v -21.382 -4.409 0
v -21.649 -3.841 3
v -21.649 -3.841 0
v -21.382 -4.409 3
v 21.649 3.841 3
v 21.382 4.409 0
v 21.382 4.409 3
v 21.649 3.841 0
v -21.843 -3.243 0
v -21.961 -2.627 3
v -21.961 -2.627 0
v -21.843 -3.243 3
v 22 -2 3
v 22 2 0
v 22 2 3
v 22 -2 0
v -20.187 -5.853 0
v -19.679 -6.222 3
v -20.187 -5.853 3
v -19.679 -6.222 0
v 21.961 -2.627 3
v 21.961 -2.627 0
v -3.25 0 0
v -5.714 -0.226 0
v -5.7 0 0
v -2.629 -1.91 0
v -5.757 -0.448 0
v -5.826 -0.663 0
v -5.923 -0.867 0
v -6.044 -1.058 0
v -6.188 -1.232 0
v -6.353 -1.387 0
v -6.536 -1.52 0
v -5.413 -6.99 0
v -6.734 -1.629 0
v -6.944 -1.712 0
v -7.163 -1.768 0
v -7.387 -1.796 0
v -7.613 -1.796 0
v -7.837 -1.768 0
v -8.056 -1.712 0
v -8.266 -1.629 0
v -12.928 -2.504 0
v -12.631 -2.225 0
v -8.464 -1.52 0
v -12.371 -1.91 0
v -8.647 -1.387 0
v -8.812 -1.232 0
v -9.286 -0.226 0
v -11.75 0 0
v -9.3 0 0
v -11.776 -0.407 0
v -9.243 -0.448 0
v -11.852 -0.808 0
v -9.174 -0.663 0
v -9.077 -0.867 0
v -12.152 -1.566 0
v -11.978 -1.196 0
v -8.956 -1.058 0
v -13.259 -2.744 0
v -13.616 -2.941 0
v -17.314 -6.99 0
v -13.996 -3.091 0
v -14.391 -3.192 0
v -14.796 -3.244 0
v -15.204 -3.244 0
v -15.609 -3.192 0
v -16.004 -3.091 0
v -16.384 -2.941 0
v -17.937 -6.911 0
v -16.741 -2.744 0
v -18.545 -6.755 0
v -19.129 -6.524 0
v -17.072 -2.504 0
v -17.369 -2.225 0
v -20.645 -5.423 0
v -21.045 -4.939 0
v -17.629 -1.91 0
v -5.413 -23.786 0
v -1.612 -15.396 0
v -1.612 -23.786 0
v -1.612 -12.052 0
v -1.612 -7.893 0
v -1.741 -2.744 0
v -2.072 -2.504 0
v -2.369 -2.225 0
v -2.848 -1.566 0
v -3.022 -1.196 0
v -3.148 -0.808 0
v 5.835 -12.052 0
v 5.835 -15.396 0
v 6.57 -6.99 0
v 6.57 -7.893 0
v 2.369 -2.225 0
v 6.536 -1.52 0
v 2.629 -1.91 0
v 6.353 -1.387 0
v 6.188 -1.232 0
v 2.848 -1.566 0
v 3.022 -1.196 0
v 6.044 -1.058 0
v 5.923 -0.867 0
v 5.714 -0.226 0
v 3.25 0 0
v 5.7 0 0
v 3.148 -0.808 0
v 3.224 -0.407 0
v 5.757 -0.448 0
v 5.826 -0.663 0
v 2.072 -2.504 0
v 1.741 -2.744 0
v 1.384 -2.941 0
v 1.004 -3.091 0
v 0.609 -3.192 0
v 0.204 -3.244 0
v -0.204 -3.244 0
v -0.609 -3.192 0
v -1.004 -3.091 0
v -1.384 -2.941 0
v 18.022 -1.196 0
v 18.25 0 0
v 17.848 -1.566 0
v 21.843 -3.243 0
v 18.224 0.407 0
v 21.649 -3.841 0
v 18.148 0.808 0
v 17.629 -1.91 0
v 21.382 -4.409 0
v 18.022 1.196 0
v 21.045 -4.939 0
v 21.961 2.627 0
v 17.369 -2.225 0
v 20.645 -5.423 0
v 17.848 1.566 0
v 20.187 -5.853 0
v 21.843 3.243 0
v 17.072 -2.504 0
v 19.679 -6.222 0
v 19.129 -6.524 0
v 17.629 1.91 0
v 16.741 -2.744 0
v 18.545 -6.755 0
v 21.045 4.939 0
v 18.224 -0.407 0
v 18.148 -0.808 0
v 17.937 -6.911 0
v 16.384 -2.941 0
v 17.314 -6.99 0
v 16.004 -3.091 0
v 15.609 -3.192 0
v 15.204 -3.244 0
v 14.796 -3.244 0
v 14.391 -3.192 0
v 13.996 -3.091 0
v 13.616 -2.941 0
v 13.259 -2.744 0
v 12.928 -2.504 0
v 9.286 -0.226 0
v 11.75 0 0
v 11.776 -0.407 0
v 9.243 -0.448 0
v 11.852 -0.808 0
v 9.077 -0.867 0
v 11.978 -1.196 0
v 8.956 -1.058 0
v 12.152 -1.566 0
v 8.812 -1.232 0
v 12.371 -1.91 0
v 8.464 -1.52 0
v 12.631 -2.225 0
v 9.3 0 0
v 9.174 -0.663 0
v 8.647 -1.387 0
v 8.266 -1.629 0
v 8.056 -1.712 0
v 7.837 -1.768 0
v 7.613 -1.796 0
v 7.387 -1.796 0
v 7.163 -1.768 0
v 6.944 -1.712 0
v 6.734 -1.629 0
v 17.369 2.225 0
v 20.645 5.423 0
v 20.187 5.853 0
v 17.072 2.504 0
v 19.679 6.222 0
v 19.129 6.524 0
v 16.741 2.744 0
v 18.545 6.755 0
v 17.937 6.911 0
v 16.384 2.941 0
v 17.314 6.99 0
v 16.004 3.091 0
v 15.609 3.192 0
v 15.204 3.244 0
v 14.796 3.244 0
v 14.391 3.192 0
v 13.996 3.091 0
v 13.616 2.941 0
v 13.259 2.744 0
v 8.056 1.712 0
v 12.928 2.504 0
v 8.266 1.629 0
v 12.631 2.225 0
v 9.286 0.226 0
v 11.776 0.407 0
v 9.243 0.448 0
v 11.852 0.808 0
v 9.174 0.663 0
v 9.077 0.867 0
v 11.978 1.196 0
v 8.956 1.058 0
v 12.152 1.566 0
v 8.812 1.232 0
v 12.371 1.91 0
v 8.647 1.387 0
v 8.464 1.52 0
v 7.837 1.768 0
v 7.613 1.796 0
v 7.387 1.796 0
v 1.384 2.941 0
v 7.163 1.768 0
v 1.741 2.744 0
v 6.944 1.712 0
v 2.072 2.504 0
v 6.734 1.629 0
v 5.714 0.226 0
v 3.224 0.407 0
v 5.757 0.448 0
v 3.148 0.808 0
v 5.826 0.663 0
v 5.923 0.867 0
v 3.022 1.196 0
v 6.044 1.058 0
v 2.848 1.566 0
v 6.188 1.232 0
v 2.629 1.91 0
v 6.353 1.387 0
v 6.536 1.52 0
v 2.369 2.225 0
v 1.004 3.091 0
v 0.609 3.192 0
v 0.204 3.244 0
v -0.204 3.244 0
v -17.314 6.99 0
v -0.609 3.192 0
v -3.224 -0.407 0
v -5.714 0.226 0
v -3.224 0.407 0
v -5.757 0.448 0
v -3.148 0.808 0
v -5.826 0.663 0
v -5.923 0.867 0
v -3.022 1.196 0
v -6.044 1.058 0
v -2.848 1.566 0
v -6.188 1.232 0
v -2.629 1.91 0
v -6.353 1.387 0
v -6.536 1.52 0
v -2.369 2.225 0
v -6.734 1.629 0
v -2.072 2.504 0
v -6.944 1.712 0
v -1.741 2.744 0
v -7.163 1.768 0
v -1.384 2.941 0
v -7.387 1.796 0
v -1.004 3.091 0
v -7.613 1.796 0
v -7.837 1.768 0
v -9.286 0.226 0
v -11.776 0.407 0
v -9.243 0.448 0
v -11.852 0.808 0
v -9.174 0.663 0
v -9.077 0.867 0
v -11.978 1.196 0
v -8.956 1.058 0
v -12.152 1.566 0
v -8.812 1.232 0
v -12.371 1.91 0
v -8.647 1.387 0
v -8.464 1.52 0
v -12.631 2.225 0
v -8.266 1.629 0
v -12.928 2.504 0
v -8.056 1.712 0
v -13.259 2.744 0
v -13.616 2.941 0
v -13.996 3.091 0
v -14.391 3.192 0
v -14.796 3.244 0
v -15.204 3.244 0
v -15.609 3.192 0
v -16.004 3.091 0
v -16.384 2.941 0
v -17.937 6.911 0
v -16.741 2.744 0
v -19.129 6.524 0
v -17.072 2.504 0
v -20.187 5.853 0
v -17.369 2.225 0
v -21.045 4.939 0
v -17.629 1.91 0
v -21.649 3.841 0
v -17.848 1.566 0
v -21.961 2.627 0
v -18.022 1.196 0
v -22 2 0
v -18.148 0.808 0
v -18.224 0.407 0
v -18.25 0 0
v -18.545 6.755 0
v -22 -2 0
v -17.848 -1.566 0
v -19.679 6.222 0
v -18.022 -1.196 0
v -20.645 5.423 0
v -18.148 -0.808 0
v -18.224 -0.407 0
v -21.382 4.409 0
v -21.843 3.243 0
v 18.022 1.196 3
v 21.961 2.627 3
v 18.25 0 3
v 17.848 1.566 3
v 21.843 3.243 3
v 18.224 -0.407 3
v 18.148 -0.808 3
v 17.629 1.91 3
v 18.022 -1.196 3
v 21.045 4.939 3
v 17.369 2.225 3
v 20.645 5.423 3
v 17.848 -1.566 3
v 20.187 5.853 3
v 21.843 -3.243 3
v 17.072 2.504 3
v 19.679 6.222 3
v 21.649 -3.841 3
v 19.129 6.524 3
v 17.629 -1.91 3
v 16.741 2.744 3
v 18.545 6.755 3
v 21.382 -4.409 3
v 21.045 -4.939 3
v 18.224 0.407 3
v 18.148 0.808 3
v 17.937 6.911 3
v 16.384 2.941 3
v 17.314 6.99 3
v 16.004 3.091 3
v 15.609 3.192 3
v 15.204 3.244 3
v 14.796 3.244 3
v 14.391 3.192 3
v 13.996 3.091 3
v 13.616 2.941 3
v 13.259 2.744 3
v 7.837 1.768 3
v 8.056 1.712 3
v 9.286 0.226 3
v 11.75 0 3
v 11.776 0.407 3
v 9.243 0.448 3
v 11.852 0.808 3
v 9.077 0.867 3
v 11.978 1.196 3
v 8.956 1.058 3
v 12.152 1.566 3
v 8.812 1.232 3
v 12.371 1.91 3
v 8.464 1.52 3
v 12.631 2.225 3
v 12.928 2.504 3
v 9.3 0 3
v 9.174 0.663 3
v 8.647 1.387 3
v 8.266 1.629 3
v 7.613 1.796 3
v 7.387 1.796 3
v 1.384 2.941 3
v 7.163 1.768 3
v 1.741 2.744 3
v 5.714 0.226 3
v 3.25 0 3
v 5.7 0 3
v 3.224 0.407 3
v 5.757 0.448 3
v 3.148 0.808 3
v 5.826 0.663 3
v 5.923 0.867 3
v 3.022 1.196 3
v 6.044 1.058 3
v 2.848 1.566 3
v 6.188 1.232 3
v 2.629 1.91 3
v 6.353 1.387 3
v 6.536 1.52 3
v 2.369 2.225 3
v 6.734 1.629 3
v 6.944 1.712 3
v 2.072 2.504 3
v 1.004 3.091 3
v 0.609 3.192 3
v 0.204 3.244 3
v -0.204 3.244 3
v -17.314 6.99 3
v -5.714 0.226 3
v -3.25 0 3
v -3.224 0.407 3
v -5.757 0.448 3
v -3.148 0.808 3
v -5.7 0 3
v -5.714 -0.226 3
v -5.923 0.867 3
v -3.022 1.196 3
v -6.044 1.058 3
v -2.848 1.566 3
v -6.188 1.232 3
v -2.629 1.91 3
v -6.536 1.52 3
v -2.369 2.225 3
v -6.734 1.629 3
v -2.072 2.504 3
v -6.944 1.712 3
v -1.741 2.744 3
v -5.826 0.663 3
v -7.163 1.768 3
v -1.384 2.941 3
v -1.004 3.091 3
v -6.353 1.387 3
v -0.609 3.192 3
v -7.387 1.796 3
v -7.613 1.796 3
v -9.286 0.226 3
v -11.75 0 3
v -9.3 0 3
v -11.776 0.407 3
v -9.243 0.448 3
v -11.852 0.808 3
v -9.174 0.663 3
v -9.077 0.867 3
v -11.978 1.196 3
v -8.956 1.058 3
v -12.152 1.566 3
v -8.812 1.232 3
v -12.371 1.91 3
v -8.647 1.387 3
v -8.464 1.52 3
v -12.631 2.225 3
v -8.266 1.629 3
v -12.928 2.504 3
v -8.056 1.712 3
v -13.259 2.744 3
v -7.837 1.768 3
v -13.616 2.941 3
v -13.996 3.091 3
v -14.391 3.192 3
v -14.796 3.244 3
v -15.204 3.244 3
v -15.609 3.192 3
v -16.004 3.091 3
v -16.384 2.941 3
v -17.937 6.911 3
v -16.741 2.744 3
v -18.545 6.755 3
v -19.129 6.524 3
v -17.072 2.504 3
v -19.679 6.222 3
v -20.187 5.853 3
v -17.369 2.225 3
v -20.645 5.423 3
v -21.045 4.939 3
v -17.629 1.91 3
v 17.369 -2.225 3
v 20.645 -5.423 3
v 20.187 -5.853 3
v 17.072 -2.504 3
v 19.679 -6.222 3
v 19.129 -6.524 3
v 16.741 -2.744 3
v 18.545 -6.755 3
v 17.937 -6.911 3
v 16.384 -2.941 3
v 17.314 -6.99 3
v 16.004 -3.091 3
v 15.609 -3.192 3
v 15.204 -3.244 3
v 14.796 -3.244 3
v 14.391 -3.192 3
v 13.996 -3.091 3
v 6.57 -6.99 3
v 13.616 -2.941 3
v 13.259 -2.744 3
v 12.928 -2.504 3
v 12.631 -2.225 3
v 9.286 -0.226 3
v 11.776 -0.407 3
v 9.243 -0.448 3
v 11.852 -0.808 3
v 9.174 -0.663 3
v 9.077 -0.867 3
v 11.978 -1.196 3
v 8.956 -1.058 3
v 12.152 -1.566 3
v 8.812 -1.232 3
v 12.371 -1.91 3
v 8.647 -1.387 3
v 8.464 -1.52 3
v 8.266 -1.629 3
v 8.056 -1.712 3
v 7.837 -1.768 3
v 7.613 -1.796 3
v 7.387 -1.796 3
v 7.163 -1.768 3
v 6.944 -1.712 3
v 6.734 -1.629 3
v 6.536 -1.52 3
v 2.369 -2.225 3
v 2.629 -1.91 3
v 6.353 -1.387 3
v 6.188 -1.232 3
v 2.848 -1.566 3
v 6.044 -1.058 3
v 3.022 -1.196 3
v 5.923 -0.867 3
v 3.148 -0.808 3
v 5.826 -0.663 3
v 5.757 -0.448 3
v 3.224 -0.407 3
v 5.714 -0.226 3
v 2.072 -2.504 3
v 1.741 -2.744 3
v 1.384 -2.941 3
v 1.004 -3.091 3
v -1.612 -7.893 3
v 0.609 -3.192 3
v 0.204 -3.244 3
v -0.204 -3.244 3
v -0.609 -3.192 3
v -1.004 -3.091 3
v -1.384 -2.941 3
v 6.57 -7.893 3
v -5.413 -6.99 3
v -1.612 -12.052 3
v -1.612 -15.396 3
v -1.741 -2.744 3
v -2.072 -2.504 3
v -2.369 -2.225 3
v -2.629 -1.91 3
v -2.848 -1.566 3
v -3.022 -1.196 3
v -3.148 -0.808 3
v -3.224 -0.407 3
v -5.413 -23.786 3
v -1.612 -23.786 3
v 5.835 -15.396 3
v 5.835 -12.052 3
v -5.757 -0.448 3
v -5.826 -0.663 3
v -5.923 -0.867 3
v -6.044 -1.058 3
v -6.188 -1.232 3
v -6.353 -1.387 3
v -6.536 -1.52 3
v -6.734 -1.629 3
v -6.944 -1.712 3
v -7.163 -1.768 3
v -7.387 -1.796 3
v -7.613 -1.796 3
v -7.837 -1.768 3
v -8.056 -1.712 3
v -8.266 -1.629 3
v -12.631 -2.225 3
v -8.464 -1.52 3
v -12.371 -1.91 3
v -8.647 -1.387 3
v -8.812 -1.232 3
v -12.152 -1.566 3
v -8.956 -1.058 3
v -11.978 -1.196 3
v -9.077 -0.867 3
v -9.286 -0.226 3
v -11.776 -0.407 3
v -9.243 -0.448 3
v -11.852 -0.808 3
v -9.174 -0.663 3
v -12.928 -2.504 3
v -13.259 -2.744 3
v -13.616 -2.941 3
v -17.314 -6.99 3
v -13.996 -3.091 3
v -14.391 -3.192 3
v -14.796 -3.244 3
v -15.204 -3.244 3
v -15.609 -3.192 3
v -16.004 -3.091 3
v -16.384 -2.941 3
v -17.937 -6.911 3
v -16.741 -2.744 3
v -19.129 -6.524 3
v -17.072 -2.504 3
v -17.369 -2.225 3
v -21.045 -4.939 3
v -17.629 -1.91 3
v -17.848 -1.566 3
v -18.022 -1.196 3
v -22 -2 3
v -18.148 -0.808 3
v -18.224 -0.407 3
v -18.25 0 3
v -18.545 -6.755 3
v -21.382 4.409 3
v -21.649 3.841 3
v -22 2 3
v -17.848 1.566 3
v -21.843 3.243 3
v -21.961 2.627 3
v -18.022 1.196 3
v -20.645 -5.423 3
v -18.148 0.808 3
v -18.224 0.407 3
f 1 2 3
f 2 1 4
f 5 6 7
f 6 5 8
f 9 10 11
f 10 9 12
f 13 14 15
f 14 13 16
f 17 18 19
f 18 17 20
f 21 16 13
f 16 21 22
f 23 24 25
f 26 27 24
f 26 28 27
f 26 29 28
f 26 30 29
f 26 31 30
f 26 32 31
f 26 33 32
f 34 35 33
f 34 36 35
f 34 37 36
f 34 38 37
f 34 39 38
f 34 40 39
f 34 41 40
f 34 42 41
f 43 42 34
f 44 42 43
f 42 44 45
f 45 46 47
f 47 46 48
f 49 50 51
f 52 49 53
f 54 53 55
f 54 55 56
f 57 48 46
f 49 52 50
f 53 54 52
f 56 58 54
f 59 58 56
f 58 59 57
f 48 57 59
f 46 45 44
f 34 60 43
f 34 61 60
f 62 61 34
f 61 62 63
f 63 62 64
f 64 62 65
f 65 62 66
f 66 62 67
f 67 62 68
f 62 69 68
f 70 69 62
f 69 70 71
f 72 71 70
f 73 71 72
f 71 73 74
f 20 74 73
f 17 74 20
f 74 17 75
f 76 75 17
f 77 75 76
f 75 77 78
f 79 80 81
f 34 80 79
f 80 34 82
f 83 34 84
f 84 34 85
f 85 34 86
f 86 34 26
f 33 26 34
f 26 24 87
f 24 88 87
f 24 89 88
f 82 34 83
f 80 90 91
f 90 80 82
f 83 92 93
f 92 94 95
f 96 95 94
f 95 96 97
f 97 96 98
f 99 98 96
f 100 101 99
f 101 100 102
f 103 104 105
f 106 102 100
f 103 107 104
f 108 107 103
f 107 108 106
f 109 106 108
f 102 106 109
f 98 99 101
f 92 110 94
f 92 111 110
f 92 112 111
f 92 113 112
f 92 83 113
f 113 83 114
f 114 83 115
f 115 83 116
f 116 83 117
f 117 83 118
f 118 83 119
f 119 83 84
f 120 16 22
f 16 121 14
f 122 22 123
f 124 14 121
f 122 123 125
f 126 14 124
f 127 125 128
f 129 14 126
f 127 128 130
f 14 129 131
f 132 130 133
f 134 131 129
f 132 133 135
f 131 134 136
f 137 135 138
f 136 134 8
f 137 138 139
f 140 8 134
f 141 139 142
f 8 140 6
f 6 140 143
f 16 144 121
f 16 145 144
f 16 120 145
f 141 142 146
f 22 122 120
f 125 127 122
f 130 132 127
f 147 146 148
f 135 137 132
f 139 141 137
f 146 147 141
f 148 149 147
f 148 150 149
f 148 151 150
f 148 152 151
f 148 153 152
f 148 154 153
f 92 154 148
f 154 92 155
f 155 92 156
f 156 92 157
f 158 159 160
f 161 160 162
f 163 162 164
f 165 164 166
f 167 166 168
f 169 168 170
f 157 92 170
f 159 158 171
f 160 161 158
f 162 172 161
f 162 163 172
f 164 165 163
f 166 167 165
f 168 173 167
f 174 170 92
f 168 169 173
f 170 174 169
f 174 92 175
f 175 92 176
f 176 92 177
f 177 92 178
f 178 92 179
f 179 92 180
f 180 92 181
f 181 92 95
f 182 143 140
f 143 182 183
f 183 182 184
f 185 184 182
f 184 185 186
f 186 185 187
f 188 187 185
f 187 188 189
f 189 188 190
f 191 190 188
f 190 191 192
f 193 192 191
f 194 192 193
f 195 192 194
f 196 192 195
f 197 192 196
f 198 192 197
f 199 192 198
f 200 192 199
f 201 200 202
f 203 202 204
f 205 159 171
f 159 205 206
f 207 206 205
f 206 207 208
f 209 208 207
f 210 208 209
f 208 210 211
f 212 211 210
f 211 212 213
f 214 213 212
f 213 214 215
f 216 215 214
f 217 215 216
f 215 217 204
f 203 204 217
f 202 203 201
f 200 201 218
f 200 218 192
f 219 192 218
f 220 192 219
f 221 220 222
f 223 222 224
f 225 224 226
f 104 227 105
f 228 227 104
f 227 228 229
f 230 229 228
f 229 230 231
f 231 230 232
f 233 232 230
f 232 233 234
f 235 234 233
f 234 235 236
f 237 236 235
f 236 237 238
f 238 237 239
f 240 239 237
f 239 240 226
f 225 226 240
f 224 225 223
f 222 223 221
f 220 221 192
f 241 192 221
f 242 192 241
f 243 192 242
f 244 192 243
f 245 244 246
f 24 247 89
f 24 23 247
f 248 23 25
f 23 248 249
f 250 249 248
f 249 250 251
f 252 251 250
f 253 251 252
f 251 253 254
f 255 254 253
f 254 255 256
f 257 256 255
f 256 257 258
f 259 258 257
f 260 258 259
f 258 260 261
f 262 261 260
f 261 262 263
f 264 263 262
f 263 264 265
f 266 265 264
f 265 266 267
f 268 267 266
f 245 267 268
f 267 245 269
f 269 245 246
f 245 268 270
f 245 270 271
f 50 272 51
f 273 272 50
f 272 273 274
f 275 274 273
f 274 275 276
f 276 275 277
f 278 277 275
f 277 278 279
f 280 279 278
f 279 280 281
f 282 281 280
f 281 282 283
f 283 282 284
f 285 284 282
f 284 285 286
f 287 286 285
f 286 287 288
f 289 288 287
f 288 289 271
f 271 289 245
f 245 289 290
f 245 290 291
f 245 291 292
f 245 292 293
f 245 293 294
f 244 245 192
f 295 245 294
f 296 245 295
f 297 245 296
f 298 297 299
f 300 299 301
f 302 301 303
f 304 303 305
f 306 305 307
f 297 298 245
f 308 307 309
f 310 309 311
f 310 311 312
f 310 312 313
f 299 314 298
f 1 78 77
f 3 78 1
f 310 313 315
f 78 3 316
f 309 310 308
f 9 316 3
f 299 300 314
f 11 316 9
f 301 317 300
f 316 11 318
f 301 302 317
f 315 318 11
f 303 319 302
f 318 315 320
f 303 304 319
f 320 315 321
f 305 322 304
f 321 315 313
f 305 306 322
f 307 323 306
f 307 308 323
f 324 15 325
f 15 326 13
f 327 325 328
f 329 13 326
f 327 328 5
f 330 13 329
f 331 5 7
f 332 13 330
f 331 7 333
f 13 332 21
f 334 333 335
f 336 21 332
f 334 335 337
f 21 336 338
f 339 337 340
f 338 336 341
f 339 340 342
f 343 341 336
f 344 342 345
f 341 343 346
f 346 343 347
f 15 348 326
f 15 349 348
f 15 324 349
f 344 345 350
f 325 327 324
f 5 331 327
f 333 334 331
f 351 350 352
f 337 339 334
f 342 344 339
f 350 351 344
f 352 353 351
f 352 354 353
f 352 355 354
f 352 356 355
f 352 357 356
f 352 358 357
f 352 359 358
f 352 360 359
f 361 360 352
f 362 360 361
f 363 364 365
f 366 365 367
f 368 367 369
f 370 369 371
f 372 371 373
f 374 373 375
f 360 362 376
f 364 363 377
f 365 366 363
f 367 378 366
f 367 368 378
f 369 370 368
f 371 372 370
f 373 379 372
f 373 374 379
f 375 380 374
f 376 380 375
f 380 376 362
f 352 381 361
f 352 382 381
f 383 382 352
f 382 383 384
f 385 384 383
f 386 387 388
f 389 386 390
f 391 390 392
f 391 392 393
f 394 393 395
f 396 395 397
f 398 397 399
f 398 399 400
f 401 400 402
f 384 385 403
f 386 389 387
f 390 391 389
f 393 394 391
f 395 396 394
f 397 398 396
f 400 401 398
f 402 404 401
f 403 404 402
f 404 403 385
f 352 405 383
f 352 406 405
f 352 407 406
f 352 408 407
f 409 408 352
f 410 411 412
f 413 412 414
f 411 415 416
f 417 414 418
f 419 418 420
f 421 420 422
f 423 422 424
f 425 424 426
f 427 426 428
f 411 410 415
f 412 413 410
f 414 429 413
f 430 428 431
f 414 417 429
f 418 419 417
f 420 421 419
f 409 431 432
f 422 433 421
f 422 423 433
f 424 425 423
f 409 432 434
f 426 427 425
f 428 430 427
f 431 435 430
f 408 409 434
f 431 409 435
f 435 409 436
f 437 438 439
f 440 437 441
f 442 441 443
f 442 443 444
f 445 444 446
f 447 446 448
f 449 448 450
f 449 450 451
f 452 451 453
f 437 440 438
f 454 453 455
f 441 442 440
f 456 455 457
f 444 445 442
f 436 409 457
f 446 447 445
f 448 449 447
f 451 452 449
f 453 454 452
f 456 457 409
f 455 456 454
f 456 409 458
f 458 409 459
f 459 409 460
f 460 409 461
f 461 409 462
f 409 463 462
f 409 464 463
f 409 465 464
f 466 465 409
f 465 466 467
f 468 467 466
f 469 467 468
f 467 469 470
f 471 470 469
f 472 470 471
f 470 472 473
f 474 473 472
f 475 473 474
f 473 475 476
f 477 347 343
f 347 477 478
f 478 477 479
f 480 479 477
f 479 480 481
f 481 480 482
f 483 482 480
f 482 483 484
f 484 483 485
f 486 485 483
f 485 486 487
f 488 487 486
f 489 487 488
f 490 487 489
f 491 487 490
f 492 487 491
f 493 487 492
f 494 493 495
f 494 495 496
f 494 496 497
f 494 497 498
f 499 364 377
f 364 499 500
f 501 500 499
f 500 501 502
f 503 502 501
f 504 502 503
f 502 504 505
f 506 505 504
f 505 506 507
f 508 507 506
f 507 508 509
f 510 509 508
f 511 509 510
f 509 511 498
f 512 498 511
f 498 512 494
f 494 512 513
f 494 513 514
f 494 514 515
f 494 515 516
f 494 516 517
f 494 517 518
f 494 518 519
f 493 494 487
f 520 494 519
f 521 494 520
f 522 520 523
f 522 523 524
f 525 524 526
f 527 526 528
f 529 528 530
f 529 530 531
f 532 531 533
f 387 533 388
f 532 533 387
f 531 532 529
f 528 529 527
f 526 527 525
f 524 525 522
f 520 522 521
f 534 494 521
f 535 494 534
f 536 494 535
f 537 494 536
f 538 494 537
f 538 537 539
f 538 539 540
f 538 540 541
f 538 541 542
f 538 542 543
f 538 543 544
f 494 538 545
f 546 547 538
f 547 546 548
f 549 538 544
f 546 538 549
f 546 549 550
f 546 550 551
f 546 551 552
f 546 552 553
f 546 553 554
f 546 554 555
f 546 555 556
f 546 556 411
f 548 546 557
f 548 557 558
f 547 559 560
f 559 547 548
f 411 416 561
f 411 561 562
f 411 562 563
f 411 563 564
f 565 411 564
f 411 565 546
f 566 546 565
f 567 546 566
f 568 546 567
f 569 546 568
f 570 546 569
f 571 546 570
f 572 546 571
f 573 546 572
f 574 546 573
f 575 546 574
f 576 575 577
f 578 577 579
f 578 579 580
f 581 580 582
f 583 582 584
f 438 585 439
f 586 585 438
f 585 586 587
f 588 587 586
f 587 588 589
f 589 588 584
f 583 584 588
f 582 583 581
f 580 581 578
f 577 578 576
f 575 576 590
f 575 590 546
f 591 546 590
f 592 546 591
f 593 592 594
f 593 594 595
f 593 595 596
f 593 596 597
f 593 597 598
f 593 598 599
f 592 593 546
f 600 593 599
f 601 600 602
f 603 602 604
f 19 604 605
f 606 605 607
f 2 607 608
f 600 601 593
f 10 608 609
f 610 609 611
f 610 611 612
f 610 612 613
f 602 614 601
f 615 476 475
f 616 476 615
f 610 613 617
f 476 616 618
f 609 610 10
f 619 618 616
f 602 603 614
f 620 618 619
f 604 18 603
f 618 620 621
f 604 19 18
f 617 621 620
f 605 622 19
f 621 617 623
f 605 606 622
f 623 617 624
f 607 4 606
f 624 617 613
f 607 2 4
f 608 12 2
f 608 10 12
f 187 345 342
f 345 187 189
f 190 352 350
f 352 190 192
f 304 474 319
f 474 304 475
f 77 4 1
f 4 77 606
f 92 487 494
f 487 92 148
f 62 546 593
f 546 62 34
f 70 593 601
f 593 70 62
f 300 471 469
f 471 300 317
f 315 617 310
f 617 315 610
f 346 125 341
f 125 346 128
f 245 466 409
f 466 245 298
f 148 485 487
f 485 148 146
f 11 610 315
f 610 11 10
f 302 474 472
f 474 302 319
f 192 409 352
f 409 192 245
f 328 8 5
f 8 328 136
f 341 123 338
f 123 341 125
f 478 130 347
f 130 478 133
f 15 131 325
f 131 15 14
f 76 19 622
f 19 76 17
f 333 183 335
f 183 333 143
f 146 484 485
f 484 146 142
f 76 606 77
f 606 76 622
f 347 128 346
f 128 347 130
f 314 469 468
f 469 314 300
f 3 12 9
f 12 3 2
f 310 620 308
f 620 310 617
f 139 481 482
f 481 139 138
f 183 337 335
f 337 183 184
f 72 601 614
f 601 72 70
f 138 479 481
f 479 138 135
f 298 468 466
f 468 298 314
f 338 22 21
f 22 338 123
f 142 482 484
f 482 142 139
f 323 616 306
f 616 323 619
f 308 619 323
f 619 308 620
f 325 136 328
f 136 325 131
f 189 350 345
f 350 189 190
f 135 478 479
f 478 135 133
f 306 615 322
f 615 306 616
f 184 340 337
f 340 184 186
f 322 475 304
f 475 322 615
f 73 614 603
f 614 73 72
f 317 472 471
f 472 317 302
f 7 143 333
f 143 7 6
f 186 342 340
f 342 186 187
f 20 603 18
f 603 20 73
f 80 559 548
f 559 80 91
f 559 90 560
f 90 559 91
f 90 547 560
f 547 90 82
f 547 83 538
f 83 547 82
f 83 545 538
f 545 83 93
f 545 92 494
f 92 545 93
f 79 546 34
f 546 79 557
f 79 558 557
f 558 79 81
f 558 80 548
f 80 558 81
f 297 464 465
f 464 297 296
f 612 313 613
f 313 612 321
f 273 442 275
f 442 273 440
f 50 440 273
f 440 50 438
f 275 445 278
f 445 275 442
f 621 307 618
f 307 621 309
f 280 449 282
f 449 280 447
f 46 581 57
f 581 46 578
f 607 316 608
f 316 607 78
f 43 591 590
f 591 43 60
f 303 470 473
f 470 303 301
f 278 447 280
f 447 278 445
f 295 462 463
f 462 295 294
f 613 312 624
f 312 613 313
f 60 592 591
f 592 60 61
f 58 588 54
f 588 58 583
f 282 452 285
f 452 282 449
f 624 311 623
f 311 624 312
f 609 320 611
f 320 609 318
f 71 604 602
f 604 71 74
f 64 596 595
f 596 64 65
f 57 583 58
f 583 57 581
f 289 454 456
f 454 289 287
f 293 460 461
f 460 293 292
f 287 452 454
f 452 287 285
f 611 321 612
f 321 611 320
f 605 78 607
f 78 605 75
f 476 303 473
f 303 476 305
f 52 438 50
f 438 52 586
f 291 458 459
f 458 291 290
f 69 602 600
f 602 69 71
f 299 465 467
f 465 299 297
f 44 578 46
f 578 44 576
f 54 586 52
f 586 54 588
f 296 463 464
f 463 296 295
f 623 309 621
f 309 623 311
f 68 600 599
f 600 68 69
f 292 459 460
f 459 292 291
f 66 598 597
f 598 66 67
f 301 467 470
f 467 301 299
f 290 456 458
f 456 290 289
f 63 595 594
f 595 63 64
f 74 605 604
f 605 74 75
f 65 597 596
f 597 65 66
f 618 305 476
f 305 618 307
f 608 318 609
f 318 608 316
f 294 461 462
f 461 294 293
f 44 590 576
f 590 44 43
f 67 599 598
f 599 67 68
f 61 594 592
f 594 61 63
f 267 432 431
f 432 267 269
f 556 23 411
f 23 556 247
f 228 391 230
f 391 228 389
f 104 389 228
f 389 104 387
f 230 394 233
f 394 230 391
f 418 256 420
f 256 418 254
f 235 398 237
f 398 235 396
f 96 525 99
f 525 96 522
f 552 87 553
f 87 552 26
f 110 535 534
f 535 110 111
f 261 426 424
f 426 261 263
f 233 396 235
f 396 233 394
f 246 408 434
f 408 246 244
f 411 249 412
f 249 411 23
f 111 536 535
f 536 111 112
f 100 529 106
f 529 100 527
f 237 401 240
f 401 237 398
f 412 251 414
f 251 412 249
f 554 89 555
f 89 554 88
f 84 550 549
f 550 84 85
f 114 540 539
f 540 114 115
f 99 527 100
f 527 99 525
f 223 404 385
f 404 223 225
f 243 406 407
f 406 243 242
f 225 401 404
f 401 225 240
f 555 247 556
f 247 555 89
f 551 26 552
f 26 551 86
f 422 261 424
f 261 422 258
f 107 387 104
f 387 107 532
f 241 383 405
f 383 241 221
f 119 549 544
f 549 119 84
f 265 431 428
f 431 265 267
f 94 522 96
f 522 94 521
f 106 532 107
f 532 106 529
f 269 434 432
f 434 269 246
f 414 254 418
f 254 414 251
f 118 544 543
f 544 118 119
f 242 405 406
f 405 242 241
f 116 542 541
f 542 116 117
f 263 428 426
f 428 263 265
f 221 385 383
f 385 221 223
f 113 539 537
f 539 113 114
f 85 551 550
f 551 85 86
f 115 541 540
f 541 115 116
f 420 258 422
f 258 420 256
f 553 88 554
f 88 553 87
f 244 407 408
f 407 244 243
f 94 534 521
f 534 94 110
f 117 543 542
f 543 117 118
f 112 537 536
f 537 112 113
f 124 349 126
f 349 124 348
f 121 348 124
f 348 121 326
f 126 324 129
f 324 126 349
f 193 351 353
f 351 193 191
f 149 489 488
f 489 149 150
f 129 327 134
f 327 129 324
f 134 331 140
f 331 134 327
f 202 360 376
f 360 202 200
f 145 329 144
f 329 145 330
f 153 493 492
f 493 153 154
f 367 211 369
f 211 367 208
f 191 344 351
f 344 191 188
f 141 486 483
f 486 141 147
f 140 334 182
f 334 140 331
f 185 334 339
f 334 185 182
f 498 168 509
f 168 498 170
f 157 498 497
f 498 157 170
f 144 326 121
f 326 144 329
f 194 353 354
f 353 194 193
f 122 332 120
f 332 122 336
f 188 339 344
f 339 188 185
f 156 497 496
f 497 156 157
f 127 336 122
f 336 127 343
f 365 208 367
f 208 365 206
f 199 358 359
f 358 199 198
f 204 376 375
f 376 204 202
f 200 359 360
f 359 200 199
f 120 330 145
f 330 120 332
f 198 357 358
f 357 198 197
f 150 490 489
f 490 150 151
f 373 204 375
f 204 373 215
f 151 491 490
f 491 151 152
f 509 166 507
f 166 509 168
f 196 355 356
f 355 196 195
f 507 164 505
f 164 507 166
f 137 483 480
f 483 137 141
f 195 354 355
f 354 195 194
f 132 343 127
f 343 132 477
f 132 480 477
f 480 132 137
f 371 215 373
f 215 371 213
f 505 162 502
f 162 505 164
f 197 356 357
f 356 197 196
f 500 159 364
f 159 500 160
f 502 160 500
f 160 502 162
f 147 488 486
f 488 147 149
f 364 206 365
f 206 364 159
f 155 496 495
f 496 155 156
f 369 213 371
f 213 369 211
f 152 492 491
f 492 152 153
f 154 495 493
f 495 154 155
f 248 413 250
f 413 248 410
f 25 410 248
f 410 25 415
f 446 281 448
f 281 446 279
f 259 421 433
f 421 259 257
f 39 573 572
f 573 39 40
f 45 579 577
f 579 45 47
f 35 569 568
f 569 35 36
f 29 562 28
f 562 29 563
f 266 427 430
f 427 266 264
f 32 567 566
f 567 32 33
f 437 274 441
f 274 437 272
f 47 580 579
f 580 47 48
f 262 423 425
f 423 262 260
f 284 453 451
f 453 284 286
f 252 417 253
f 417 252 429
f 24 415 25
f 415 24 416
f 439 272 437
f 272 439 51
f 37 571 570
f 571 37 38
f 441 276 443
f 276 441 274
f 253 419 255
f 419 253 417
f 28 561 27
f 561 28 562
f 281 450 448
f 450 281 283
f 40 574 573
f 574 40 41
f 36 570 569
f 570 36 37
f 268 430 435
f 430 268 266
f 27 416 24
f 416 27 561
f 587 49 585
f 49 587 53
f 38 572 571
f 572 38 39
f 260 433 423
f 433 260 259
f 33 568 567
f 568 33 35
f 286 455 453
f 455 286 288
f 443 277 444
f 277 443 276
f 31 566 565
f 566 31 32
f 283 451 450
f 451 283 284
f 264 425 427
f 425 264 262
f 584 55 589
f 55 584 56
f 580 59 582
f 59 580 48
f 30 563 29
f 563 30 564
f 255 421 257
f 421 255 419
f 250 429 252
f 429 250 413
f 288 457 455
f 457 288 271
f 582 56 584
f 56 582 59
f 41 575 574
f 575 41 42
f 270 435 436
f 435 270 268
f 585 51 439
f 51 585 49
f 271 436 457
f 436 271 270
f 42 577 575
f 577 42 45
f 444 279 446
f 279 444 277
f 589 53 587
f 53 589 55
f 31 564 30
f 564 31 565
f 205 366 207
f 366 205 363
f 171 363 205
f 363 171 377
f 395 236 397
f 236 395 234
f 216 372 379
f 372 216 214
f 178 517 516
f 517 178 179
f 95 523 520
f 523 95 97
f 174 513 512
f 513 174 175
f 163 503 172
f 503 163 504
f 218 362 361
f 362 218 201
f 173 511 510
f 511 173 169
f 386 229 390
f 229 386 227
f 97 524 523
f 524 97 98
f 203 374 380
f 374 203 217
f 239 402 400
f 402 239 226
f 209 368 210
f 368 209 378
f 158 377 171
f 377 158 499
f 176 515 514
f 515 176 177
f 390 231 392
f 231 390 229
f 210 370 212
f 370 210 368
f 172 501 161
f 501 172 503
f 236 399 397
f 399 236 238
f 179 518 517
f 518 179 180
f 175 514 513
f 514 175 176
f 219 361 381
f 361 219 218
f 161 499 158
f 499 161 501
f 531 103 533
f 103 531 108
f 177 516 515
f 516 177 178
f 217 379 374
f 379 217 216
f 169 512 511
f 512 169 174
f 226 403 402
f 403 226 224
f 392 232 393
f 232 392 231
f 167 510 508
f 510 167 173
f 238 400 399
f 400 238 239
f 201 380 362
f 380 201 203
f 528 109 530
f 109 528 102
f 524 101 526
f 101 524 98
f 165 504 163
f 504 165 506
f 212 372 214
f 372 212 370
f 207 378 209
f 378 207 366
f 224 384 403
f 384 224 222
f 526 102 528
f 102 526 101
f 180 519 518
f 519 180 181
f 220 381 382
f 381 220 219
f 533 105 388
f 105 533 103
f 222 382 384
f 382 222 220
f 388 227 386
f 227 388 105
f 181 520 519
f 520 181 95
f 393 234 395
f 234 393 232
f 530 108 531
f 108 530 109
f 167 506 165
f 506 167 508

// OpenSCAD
$fn = 50;


difference() {
	union() {
		hull() {
			translate(v = [-17.0000000000, 2.0000000000, 0]) {
				cylinder(h = 3, r = 5);
			}
			translate(v = [17.0000000000, 2.0000000000, 0]) {
				cylinder(h = 3, r = 5);
			}
			translate(v = [-17.0000000000, -2.0000000000, 0]) {
				cylinder(h = 3, r = 5);
			}
			translate(v = [17.0000000000, -2.0000000000, 0]) {
				cylinder(h = 3, r = 5);
			}
		}
		translate(v = [0, -5, 0]) {
			linear_extrude(height = 3) {
				text(font = "DejaVu Sans Mono:style=Bold", halign = "center", size = 19.0000000000, text = "F", valign = "top");
			}
		}
	}
	union() {
		translate(v = [-15.0000000000, 0.0000000000, 0]) {
			translate(v = [0, 0, -100]) {
				cylinder(h = 200, r = 3.2500000000);
			}
		}
		translate(v = [0, 0, -100]) {
			cylinder(h = 200, r = 3.2500000000);
		}
		translate(v = [15.0000000000, 0.0000000000, 0]) {
			translate(v = [0, 0, -100]) {
				cylinder(h = 200, r = 3.2500000000);
			}
		}
		translate(v = [-15.0000000000, 0.0000000000, 0]) {
			translate(v = [0, 0, -100]) {
				cylinder(h = 200, r = 1.8000000000);
			}
		}
		translate(v = [-7.5000000000, 0.0000000000, 0]) {
			translate(v = [0, 0, -100]) {
				cylinder(h = 200, r = 1.8000000000);
			}
		}
		translate(v = [0, 0, -100]) {
			cylinder(h = 200, r = 1.8000000000);
		}
		translate(v = [7.5000000000, 0.0000000000, 0]) {
			translate(v = [0, 0, -100]) {
				cylinder(h = 200, r = 1.8000000000);
			}
		}
		translate(v = [15.0000000000, 0.0000000000, 0]) {
			translate(v = [0, 0, -100]) {
				cylinder(h = 200, r = 1.8000000000);
			}
		}
	}
}
